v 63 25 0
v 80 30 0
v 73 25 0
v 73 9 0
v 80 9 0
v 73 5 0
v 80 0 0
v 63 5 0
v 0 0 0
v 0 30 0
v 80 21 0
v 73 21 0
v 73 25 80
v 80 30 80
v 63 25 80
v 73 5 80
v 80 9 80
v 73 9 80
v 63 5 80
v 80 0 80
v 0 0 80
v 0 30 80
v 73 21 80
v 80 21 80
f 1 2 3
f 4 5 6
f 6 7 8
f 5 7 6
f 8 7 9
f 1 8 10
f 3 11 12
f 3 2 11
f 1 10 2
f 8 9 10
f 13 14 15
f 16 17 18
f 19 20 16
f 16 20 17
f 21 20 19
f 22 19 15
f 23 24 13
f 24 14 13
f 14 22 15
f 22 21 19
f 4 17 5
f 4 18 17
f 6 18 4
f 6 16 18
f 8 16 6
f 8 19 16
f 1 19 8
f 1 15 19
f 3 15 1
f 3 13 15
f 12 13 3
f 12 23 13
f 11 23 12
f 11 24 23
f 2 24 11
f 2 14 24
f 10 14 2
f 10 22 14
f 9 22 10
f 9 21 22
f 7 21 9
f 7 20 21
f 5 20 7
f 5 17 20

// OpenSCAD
$fn = 32;

// ----------------------------------------------------------------------
// T-slot rail: 80 x 30 mm section, 80 mm long
// ----------------------------------------------------------------------

// --- parameters (mm) ---
profile_height = 80;      // extrusion height
profile_points = 12;      // points of the closed outline

profile = [[0, 0], [80, 0], [80, 9], [73, 9], [73, 5], [63, 5], [63, 25], [73, 25], [73, 21], [80, 21], [80, 30], [0, 30]];  // single closed polygon, 12 points, counter clockwise

// --- the one profile operation ---
linear_extrude(height = profile_height) polygon(points = profile);
